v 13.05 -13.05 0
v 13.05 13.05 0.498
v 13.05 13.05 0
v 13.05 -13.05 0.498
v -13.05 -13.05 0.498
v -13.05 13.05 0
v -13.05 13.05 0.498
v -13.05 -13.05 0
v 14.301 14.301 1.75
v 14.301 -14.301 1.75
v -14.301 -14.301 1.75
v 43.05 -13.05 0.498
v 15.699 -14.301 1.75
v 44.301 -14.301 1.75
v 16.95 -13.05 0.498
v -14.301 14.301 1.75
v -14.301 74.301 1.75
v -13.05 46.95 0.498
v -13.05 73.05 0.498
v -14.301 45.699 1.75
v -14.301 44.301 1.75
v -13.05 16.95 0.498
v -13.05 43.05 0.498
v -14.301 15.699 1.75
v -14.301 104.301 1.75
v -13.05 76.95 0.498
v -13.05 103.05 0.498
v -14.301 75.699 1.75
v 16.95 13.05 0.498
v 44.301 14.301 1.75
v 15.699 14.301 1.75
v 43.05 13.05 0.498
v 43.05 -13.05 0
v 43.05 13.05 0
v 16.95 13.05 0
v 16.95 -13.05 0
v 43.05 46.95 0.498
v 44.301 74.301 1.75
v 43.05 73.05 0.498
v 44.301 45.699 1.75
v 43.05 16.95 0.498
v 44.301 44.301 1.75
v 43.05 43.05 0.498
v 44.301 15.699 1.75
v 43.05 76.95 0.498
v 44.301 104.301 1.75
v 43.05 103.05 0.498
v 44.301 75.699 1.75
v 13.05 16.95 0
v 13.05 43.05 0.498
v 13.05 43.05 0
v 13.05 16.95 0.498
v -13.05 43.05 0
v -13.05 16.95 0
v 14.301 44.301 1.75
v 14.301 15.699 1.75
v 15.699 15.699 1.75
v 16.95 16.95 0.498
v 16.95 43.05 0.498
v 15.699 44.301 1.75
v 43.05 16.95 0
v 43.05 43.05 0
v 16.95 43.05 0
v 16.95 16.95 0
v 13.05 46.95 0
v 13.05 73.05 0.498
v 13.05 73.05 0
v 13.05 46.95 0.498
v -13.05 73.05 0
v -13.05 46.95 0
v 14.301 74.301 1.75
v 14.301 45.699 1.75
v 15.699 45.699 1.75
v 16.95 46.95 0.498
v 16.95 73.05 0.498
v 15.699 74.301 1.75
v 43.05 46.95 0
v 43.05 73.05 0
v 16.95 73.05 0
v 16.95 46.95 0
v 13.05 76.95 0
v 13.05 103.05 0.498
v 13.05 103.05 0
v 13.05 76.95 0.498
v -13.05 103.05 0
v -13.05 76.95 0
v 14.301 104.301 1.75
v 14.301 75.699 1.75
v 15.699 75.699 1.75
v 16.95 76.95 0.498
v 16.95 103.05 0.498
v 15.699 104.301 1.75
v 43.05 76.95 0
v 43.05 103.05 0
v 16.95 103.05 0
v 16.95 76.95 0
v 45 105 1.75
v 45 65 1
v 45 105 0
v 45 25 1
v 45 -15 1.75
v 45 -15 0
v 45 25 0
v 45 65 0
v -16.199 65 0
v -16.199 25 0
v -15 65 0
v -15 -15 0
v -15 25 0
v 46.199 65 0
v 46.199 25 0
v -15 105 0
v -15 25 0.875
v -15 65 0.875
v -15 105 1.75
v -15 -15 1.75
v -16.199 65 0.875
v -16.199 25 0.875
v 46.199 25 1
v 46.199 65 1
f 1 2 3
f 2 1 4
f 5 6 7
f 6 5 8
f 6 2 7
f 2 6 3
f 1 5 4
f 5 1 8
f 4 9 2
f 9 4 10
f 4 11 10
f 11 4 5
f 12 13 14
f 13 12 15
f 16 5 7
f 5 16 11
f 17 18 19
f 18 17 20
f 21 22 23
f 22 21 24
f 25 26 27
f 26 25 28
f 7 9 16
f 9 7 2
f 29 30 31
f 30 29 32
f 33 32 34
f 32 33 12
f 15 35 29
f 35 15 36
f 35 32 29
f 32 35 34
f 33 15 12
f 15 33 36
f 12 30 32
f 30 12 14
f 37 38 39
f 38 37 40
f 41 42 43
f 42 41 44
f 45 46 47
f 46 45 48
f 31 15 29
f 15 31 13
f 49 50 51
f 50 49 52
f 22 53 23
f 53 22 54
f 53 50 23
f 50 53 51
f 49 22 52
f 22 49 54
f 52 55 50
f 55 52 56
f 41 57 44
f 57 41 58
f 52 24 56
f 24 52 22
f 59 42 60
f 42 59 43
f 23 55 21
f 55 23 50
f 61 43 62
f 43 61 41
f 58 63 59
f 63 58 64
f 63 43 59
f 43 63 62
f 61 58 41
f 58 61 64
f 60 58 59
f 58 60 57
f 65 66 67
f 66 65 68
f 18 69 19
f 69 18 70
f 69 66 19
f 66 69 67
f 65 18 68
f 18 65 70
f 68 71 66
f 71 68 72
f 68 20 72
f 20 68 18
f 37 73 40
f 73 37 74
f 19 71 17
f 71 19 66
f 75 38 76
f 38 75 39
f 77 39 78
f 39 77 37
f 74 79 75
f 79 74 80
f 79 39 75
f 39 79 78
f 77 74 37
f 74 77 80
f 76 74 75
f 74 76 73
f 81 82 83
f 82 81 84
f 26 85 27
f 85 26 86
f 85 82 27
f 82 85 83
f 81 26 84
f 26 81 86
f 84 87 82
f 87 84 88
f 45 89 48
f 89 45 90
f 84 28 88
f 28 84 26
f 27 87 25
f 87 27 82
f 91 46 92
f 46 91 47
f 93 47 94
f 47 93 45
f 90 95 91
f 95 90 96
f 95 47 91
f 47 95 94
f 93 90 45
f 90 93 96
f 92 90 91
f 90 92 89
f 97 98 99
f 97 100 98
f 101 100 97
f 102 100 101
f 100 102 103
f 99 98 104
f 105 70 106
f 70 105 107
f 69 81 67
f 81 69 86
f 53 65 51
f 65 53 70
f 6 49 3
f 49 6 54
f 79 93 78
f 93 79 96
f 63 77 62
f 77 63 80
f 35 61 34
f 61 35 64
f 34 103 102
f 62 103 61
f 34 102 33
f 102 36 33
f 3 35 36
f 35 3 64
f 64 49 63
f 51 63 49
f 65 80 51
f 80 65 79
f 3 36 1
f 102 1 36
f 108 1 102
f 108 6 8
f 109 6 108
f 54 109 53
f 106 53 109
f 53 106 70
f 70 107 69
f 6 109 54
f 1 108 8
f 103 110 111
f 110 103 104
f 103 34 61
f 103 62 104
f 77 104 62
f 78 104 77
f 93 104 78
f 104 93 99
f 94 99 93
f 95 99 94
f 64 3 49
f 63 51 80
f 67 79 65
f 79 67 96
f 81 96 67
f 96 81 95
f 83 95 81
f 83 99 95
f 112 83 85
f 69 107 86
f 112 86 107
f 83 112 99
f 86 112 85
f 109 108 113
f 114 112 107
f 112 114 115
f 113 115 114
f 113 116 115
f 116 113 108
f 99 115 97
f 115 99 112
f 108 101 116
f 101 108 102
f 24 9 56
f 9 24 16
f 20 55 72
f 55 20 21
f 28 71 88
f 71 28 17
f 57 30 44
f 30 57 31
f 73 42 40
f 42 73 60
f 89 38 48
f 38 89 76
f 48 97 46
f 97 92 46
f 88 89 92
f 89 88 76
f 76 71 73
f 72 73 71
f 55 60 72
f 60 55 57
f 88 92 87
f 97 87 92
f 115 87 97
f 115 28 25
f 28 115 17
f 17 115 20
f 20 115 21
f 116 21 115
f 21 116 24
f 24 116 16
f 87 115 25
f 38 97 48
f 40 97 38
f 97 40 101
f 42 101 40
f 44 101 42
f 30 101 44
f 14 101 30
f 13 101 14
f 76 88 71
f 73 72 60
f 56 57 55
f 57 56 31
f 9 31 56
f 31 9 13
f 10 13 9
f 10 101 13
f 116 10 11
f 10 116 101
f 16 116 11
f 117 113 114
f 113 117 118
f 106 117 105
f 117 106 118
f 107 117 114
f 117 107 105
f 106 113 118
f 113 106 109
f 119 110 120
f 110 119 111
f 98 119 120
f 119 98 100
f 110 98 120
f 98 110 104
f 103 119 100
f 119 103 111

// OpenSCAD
// file: ../assorter.scad
// Variables

e=0.001;

x = 2;
y = 3;

//box();
//grid();
//slice();
//stack();

function middle(times) = -length_default/2 +(length_default+(times-1)*pitch_default)/2 ;
left   = -length_default/2 ;
front  = -length_default/2 ;
right  =  length_default/2+(x-1)*pitch_default ;
back   =  length_default/2+(y-1)*pitch_default ;
bottom =  0;
top    =  height_default;


grid_height = lift_default + triangle_height_default - cut_default ;

module body_form(
A,B,K,L,height
){
    polyhedron(
        points = [
            [-A,-B, 0],  // 0
            [ A,-B, 0],   // 1
            [ A, B, 0],  // 2
            [-A, B, 0], // 3
            [-K,-L, height],  // 0
            [ K,-L, height],   // 1
            [ K, L, height],  // 2
            [-K, L, height]], // 3
        faces = [
            [0,1,2,3],  // bottom
            [4,5,1,0],  // front
            [7,6,5,4],  // top
            [5,6,2,1],  // right
            [6,7,3,2],  // back
            [7,4,0,3]] // left
        );
}

module box_bottom(
  lift = lift_default,
  length = length_default,
  height = height_default ,
  triangle_height = triangle_height_default,
  bottom = true, // if the bottom should be added or not... (the inner one should not have it)
){

    // größere
    K = length/2 ;
    L = K;
    // kleinere
    A = (length-2*triangle_height)/2;
    B = A;
    remaining_height = height - lift - triangle_height;
    if (bottom) {
    translate([0,0,(lift+1)/2])
        cube([2*A,2*B,lift+1],center=true);
    }
    translate([0,0,lift-e])
    // creates an inverted cut pyramid
    body_form(A,B,K,L,triangle_height+e);

}

module solid_box(
  x = x,
  y = y,
  lift = lift_default,
  length = length_default,
  height = height_default ,
  triangle_height = triangle_height_default,
  pitch = pitch_default,
  bottom = true,
  cut_sides = true,
  fill_pyramid_tip = false,
){
    difference(){
    union(){
        remaining_height = height - lift - triangle_height;
        for (m = [0:y-1]){
            for (n = [0:x-1])
                translate([n*pitch,m*pitch,0])
                    box_bottom(length=length,bottom=bottom);
        }
        translate([-length/2,-length/2,lift + triangle_height-e])
            cube([(x-1)*pitch+length,(y-1)*pitch +length,remaining_height]);

        if (fill_pyramid_tip){
            // fill the gaps inside the pyramids *shrug*
            translate([-length/2,-length/2,triangle_height+0.1])
                cube([(x-1)*pitch+length,(y-1)*pitch +length,1]);
        }
    }
    if (cut_sides) {
        // cut left side of box
        translate([-length/2,-length/2-2,0])
            cut_object(length = (y-1)*pitch +length +4 );

        // cut right side of box
        translate([(x-1)*pitch+length/2,-length/2-2,0])
        mirror(v=[1,0,0])
            cut_object(length = (y-1)*pitch +length +4 );

        // cut front side of box
        //translate([(x-1)*pitch+length/2,-length/2-2,0])
        translate([-length/2-2,-length/2,0])
        rotate([0,0,-90])
        mirror(v=[1,0,0])
            cut_object(length = (x-1)*pitch +length +4 );

        // cut back side of box
        translate([-length/2-2,length/2+(y-1)*pitch,0])
        rotate([0,0,-90])
            cut_object(length = (x-1)*pitch +length +4 );
        }
    }

}

module box(handle_enable = true){
    difference(){
        solid_box(fill_pyramid_tip=true);
        // inner solid box without the cubed lift on the bottom.. now the wall thickness looks quite okay
        // we have to lower the innter box about lift_default distance again
        translate([0,0,wall_thickness_default- lift_default])
            solid_box(length = length_default - 2* wall_thickness_default,bottom=false);
    }
    if (handle_enable) {
        // add handle
        translate([
            middle(x),
            -length_default/2+wall_thickness_default,
            height_default-handle_top_distance
        ])
            handle();
    }
}

module grid(
  x = x,
  y = y,
  lift = lift_default,
  length = length_default,
  height = height_default ,
  triangle_height = triangle_height_default,
  pitch = pitch_default
){
    difference(){
    // main body
        union(){
            difference(){
                translate([-length/2,-length/2,0])
                cube([(x-1)*pitch+length,(y-1)*pitch +length,lift+triangle_height]);

                translate([0,0,-e])
                    solid_box(length= length_default + 0.1, cut_sides = false );     // do we need some added clearence here?
            }
        }

    translate([-length/2-1,-length/2-1,lift + triangle_height - cut_default])
        cube([(x-1)*pitch+length+2,(y-1)*pitch +length + 2,2]);
    }
}


module cut_object(
    length = length_default,
    height = height_default,
    diff_bottom = diff_bottom_default,

){
    rotate([-90,0,0])
    linear_extrude(height=length)

        polygon(
            [   [-e,0],
                [-e,-height],
                [0,-height],
                [diff_bottom,0]
            ]
            );
}

module slice() {
    difference(){
        box();
        translate([-length_default/2-10,-length_default/2-10,-5])
        cube([
            1/2*(length_default+(x-1)*pitch_default + 20),
            length_default+(y-1)*pitch_default +20,
            height_default+10]);
    }
}

module handle(){
    r = 2;
    $fa = 1;
    $fs = 0.4;

    rotate([0,180,0])
    hull(){
        hull(){
            //left corner
            translate([-handle_width/2,0,0])
                cube([1,1,handle_top_height ]);

            // right corner
            translate([handle_width/2,0,0])
            translate([-1,0,0])
                cube([1,1,handle_top_height ]);

            // left round corner
            translate([-handle_width/2,handle_depth])
            translate([r,-r,0])
            cylinder(r=r,h=handle_top_height);

            // right round corner
            translate([handle_width/2,handle_depth])
            translate([-r,-r,0])
            cylinder(r=r,h=handle_top_height );
        }

        // hull anchor
        height = handle_depth / tan(handle_angle);

        translate([-handle_width/2,0,0])
            cube([handle_width,0.1,height]);
    }
}

module stack(){
    // module to preview a stacked box
    slice();
    translate([0,0,height_default-handle_top_distance ])
    slice();
}
// file: defaults.scad
/*
set of variables for the mini drawer-cabinet version
each box is 62.5 by 120 mm in Size
With this Settings 2 by 4 boxes could fit in each drawer
*/

length_default = 30 ;
pitch_default  = 30 ;

height_default = 33; // in theory 35, but then they have to sit perfectly to not block the schublade

triangle_height_default = 2 ;
triangle_width_default  = 2 * triangle_height_default;
cut_default=0.75;
lift_default=0.5;

wall_thickness_default = 1;

handle_width = 15;
handle_depth = 7;

handle_top_height = 1;
handle_angle = 45; // degree
handle_top_distance = 1.75; // am gedruckten objekt zu prüfen

diff_bottom_default = 0.5;
// main file
// grids ;-D

include <defaults.scad>
include <../assorter.scad>

x = 2;
y = 4;

gap = 2.4 ; // gap between the grid in x axis and the inner Wall of the Drawer box

grid(x=x,y=y);

// Schubladen helper bumper
// this should help that the grid stays in the middle of the Schublade
bumper_x_width = 40 ;
translate(
    [
        -gap/2 - length_default/2 + e,
        -bumper_x_width/2 + middle(y),
        ,0
    ])
cube([gap/2,bumper_x_width,grid_height/2]);

translate(
    [
        (x-1)*pitch_default+length_default/2 - e,
        -bumper_x_width/2 + middle(y),
        ,0
    ])
cube([gap/2,bumper_x_width,1]);
